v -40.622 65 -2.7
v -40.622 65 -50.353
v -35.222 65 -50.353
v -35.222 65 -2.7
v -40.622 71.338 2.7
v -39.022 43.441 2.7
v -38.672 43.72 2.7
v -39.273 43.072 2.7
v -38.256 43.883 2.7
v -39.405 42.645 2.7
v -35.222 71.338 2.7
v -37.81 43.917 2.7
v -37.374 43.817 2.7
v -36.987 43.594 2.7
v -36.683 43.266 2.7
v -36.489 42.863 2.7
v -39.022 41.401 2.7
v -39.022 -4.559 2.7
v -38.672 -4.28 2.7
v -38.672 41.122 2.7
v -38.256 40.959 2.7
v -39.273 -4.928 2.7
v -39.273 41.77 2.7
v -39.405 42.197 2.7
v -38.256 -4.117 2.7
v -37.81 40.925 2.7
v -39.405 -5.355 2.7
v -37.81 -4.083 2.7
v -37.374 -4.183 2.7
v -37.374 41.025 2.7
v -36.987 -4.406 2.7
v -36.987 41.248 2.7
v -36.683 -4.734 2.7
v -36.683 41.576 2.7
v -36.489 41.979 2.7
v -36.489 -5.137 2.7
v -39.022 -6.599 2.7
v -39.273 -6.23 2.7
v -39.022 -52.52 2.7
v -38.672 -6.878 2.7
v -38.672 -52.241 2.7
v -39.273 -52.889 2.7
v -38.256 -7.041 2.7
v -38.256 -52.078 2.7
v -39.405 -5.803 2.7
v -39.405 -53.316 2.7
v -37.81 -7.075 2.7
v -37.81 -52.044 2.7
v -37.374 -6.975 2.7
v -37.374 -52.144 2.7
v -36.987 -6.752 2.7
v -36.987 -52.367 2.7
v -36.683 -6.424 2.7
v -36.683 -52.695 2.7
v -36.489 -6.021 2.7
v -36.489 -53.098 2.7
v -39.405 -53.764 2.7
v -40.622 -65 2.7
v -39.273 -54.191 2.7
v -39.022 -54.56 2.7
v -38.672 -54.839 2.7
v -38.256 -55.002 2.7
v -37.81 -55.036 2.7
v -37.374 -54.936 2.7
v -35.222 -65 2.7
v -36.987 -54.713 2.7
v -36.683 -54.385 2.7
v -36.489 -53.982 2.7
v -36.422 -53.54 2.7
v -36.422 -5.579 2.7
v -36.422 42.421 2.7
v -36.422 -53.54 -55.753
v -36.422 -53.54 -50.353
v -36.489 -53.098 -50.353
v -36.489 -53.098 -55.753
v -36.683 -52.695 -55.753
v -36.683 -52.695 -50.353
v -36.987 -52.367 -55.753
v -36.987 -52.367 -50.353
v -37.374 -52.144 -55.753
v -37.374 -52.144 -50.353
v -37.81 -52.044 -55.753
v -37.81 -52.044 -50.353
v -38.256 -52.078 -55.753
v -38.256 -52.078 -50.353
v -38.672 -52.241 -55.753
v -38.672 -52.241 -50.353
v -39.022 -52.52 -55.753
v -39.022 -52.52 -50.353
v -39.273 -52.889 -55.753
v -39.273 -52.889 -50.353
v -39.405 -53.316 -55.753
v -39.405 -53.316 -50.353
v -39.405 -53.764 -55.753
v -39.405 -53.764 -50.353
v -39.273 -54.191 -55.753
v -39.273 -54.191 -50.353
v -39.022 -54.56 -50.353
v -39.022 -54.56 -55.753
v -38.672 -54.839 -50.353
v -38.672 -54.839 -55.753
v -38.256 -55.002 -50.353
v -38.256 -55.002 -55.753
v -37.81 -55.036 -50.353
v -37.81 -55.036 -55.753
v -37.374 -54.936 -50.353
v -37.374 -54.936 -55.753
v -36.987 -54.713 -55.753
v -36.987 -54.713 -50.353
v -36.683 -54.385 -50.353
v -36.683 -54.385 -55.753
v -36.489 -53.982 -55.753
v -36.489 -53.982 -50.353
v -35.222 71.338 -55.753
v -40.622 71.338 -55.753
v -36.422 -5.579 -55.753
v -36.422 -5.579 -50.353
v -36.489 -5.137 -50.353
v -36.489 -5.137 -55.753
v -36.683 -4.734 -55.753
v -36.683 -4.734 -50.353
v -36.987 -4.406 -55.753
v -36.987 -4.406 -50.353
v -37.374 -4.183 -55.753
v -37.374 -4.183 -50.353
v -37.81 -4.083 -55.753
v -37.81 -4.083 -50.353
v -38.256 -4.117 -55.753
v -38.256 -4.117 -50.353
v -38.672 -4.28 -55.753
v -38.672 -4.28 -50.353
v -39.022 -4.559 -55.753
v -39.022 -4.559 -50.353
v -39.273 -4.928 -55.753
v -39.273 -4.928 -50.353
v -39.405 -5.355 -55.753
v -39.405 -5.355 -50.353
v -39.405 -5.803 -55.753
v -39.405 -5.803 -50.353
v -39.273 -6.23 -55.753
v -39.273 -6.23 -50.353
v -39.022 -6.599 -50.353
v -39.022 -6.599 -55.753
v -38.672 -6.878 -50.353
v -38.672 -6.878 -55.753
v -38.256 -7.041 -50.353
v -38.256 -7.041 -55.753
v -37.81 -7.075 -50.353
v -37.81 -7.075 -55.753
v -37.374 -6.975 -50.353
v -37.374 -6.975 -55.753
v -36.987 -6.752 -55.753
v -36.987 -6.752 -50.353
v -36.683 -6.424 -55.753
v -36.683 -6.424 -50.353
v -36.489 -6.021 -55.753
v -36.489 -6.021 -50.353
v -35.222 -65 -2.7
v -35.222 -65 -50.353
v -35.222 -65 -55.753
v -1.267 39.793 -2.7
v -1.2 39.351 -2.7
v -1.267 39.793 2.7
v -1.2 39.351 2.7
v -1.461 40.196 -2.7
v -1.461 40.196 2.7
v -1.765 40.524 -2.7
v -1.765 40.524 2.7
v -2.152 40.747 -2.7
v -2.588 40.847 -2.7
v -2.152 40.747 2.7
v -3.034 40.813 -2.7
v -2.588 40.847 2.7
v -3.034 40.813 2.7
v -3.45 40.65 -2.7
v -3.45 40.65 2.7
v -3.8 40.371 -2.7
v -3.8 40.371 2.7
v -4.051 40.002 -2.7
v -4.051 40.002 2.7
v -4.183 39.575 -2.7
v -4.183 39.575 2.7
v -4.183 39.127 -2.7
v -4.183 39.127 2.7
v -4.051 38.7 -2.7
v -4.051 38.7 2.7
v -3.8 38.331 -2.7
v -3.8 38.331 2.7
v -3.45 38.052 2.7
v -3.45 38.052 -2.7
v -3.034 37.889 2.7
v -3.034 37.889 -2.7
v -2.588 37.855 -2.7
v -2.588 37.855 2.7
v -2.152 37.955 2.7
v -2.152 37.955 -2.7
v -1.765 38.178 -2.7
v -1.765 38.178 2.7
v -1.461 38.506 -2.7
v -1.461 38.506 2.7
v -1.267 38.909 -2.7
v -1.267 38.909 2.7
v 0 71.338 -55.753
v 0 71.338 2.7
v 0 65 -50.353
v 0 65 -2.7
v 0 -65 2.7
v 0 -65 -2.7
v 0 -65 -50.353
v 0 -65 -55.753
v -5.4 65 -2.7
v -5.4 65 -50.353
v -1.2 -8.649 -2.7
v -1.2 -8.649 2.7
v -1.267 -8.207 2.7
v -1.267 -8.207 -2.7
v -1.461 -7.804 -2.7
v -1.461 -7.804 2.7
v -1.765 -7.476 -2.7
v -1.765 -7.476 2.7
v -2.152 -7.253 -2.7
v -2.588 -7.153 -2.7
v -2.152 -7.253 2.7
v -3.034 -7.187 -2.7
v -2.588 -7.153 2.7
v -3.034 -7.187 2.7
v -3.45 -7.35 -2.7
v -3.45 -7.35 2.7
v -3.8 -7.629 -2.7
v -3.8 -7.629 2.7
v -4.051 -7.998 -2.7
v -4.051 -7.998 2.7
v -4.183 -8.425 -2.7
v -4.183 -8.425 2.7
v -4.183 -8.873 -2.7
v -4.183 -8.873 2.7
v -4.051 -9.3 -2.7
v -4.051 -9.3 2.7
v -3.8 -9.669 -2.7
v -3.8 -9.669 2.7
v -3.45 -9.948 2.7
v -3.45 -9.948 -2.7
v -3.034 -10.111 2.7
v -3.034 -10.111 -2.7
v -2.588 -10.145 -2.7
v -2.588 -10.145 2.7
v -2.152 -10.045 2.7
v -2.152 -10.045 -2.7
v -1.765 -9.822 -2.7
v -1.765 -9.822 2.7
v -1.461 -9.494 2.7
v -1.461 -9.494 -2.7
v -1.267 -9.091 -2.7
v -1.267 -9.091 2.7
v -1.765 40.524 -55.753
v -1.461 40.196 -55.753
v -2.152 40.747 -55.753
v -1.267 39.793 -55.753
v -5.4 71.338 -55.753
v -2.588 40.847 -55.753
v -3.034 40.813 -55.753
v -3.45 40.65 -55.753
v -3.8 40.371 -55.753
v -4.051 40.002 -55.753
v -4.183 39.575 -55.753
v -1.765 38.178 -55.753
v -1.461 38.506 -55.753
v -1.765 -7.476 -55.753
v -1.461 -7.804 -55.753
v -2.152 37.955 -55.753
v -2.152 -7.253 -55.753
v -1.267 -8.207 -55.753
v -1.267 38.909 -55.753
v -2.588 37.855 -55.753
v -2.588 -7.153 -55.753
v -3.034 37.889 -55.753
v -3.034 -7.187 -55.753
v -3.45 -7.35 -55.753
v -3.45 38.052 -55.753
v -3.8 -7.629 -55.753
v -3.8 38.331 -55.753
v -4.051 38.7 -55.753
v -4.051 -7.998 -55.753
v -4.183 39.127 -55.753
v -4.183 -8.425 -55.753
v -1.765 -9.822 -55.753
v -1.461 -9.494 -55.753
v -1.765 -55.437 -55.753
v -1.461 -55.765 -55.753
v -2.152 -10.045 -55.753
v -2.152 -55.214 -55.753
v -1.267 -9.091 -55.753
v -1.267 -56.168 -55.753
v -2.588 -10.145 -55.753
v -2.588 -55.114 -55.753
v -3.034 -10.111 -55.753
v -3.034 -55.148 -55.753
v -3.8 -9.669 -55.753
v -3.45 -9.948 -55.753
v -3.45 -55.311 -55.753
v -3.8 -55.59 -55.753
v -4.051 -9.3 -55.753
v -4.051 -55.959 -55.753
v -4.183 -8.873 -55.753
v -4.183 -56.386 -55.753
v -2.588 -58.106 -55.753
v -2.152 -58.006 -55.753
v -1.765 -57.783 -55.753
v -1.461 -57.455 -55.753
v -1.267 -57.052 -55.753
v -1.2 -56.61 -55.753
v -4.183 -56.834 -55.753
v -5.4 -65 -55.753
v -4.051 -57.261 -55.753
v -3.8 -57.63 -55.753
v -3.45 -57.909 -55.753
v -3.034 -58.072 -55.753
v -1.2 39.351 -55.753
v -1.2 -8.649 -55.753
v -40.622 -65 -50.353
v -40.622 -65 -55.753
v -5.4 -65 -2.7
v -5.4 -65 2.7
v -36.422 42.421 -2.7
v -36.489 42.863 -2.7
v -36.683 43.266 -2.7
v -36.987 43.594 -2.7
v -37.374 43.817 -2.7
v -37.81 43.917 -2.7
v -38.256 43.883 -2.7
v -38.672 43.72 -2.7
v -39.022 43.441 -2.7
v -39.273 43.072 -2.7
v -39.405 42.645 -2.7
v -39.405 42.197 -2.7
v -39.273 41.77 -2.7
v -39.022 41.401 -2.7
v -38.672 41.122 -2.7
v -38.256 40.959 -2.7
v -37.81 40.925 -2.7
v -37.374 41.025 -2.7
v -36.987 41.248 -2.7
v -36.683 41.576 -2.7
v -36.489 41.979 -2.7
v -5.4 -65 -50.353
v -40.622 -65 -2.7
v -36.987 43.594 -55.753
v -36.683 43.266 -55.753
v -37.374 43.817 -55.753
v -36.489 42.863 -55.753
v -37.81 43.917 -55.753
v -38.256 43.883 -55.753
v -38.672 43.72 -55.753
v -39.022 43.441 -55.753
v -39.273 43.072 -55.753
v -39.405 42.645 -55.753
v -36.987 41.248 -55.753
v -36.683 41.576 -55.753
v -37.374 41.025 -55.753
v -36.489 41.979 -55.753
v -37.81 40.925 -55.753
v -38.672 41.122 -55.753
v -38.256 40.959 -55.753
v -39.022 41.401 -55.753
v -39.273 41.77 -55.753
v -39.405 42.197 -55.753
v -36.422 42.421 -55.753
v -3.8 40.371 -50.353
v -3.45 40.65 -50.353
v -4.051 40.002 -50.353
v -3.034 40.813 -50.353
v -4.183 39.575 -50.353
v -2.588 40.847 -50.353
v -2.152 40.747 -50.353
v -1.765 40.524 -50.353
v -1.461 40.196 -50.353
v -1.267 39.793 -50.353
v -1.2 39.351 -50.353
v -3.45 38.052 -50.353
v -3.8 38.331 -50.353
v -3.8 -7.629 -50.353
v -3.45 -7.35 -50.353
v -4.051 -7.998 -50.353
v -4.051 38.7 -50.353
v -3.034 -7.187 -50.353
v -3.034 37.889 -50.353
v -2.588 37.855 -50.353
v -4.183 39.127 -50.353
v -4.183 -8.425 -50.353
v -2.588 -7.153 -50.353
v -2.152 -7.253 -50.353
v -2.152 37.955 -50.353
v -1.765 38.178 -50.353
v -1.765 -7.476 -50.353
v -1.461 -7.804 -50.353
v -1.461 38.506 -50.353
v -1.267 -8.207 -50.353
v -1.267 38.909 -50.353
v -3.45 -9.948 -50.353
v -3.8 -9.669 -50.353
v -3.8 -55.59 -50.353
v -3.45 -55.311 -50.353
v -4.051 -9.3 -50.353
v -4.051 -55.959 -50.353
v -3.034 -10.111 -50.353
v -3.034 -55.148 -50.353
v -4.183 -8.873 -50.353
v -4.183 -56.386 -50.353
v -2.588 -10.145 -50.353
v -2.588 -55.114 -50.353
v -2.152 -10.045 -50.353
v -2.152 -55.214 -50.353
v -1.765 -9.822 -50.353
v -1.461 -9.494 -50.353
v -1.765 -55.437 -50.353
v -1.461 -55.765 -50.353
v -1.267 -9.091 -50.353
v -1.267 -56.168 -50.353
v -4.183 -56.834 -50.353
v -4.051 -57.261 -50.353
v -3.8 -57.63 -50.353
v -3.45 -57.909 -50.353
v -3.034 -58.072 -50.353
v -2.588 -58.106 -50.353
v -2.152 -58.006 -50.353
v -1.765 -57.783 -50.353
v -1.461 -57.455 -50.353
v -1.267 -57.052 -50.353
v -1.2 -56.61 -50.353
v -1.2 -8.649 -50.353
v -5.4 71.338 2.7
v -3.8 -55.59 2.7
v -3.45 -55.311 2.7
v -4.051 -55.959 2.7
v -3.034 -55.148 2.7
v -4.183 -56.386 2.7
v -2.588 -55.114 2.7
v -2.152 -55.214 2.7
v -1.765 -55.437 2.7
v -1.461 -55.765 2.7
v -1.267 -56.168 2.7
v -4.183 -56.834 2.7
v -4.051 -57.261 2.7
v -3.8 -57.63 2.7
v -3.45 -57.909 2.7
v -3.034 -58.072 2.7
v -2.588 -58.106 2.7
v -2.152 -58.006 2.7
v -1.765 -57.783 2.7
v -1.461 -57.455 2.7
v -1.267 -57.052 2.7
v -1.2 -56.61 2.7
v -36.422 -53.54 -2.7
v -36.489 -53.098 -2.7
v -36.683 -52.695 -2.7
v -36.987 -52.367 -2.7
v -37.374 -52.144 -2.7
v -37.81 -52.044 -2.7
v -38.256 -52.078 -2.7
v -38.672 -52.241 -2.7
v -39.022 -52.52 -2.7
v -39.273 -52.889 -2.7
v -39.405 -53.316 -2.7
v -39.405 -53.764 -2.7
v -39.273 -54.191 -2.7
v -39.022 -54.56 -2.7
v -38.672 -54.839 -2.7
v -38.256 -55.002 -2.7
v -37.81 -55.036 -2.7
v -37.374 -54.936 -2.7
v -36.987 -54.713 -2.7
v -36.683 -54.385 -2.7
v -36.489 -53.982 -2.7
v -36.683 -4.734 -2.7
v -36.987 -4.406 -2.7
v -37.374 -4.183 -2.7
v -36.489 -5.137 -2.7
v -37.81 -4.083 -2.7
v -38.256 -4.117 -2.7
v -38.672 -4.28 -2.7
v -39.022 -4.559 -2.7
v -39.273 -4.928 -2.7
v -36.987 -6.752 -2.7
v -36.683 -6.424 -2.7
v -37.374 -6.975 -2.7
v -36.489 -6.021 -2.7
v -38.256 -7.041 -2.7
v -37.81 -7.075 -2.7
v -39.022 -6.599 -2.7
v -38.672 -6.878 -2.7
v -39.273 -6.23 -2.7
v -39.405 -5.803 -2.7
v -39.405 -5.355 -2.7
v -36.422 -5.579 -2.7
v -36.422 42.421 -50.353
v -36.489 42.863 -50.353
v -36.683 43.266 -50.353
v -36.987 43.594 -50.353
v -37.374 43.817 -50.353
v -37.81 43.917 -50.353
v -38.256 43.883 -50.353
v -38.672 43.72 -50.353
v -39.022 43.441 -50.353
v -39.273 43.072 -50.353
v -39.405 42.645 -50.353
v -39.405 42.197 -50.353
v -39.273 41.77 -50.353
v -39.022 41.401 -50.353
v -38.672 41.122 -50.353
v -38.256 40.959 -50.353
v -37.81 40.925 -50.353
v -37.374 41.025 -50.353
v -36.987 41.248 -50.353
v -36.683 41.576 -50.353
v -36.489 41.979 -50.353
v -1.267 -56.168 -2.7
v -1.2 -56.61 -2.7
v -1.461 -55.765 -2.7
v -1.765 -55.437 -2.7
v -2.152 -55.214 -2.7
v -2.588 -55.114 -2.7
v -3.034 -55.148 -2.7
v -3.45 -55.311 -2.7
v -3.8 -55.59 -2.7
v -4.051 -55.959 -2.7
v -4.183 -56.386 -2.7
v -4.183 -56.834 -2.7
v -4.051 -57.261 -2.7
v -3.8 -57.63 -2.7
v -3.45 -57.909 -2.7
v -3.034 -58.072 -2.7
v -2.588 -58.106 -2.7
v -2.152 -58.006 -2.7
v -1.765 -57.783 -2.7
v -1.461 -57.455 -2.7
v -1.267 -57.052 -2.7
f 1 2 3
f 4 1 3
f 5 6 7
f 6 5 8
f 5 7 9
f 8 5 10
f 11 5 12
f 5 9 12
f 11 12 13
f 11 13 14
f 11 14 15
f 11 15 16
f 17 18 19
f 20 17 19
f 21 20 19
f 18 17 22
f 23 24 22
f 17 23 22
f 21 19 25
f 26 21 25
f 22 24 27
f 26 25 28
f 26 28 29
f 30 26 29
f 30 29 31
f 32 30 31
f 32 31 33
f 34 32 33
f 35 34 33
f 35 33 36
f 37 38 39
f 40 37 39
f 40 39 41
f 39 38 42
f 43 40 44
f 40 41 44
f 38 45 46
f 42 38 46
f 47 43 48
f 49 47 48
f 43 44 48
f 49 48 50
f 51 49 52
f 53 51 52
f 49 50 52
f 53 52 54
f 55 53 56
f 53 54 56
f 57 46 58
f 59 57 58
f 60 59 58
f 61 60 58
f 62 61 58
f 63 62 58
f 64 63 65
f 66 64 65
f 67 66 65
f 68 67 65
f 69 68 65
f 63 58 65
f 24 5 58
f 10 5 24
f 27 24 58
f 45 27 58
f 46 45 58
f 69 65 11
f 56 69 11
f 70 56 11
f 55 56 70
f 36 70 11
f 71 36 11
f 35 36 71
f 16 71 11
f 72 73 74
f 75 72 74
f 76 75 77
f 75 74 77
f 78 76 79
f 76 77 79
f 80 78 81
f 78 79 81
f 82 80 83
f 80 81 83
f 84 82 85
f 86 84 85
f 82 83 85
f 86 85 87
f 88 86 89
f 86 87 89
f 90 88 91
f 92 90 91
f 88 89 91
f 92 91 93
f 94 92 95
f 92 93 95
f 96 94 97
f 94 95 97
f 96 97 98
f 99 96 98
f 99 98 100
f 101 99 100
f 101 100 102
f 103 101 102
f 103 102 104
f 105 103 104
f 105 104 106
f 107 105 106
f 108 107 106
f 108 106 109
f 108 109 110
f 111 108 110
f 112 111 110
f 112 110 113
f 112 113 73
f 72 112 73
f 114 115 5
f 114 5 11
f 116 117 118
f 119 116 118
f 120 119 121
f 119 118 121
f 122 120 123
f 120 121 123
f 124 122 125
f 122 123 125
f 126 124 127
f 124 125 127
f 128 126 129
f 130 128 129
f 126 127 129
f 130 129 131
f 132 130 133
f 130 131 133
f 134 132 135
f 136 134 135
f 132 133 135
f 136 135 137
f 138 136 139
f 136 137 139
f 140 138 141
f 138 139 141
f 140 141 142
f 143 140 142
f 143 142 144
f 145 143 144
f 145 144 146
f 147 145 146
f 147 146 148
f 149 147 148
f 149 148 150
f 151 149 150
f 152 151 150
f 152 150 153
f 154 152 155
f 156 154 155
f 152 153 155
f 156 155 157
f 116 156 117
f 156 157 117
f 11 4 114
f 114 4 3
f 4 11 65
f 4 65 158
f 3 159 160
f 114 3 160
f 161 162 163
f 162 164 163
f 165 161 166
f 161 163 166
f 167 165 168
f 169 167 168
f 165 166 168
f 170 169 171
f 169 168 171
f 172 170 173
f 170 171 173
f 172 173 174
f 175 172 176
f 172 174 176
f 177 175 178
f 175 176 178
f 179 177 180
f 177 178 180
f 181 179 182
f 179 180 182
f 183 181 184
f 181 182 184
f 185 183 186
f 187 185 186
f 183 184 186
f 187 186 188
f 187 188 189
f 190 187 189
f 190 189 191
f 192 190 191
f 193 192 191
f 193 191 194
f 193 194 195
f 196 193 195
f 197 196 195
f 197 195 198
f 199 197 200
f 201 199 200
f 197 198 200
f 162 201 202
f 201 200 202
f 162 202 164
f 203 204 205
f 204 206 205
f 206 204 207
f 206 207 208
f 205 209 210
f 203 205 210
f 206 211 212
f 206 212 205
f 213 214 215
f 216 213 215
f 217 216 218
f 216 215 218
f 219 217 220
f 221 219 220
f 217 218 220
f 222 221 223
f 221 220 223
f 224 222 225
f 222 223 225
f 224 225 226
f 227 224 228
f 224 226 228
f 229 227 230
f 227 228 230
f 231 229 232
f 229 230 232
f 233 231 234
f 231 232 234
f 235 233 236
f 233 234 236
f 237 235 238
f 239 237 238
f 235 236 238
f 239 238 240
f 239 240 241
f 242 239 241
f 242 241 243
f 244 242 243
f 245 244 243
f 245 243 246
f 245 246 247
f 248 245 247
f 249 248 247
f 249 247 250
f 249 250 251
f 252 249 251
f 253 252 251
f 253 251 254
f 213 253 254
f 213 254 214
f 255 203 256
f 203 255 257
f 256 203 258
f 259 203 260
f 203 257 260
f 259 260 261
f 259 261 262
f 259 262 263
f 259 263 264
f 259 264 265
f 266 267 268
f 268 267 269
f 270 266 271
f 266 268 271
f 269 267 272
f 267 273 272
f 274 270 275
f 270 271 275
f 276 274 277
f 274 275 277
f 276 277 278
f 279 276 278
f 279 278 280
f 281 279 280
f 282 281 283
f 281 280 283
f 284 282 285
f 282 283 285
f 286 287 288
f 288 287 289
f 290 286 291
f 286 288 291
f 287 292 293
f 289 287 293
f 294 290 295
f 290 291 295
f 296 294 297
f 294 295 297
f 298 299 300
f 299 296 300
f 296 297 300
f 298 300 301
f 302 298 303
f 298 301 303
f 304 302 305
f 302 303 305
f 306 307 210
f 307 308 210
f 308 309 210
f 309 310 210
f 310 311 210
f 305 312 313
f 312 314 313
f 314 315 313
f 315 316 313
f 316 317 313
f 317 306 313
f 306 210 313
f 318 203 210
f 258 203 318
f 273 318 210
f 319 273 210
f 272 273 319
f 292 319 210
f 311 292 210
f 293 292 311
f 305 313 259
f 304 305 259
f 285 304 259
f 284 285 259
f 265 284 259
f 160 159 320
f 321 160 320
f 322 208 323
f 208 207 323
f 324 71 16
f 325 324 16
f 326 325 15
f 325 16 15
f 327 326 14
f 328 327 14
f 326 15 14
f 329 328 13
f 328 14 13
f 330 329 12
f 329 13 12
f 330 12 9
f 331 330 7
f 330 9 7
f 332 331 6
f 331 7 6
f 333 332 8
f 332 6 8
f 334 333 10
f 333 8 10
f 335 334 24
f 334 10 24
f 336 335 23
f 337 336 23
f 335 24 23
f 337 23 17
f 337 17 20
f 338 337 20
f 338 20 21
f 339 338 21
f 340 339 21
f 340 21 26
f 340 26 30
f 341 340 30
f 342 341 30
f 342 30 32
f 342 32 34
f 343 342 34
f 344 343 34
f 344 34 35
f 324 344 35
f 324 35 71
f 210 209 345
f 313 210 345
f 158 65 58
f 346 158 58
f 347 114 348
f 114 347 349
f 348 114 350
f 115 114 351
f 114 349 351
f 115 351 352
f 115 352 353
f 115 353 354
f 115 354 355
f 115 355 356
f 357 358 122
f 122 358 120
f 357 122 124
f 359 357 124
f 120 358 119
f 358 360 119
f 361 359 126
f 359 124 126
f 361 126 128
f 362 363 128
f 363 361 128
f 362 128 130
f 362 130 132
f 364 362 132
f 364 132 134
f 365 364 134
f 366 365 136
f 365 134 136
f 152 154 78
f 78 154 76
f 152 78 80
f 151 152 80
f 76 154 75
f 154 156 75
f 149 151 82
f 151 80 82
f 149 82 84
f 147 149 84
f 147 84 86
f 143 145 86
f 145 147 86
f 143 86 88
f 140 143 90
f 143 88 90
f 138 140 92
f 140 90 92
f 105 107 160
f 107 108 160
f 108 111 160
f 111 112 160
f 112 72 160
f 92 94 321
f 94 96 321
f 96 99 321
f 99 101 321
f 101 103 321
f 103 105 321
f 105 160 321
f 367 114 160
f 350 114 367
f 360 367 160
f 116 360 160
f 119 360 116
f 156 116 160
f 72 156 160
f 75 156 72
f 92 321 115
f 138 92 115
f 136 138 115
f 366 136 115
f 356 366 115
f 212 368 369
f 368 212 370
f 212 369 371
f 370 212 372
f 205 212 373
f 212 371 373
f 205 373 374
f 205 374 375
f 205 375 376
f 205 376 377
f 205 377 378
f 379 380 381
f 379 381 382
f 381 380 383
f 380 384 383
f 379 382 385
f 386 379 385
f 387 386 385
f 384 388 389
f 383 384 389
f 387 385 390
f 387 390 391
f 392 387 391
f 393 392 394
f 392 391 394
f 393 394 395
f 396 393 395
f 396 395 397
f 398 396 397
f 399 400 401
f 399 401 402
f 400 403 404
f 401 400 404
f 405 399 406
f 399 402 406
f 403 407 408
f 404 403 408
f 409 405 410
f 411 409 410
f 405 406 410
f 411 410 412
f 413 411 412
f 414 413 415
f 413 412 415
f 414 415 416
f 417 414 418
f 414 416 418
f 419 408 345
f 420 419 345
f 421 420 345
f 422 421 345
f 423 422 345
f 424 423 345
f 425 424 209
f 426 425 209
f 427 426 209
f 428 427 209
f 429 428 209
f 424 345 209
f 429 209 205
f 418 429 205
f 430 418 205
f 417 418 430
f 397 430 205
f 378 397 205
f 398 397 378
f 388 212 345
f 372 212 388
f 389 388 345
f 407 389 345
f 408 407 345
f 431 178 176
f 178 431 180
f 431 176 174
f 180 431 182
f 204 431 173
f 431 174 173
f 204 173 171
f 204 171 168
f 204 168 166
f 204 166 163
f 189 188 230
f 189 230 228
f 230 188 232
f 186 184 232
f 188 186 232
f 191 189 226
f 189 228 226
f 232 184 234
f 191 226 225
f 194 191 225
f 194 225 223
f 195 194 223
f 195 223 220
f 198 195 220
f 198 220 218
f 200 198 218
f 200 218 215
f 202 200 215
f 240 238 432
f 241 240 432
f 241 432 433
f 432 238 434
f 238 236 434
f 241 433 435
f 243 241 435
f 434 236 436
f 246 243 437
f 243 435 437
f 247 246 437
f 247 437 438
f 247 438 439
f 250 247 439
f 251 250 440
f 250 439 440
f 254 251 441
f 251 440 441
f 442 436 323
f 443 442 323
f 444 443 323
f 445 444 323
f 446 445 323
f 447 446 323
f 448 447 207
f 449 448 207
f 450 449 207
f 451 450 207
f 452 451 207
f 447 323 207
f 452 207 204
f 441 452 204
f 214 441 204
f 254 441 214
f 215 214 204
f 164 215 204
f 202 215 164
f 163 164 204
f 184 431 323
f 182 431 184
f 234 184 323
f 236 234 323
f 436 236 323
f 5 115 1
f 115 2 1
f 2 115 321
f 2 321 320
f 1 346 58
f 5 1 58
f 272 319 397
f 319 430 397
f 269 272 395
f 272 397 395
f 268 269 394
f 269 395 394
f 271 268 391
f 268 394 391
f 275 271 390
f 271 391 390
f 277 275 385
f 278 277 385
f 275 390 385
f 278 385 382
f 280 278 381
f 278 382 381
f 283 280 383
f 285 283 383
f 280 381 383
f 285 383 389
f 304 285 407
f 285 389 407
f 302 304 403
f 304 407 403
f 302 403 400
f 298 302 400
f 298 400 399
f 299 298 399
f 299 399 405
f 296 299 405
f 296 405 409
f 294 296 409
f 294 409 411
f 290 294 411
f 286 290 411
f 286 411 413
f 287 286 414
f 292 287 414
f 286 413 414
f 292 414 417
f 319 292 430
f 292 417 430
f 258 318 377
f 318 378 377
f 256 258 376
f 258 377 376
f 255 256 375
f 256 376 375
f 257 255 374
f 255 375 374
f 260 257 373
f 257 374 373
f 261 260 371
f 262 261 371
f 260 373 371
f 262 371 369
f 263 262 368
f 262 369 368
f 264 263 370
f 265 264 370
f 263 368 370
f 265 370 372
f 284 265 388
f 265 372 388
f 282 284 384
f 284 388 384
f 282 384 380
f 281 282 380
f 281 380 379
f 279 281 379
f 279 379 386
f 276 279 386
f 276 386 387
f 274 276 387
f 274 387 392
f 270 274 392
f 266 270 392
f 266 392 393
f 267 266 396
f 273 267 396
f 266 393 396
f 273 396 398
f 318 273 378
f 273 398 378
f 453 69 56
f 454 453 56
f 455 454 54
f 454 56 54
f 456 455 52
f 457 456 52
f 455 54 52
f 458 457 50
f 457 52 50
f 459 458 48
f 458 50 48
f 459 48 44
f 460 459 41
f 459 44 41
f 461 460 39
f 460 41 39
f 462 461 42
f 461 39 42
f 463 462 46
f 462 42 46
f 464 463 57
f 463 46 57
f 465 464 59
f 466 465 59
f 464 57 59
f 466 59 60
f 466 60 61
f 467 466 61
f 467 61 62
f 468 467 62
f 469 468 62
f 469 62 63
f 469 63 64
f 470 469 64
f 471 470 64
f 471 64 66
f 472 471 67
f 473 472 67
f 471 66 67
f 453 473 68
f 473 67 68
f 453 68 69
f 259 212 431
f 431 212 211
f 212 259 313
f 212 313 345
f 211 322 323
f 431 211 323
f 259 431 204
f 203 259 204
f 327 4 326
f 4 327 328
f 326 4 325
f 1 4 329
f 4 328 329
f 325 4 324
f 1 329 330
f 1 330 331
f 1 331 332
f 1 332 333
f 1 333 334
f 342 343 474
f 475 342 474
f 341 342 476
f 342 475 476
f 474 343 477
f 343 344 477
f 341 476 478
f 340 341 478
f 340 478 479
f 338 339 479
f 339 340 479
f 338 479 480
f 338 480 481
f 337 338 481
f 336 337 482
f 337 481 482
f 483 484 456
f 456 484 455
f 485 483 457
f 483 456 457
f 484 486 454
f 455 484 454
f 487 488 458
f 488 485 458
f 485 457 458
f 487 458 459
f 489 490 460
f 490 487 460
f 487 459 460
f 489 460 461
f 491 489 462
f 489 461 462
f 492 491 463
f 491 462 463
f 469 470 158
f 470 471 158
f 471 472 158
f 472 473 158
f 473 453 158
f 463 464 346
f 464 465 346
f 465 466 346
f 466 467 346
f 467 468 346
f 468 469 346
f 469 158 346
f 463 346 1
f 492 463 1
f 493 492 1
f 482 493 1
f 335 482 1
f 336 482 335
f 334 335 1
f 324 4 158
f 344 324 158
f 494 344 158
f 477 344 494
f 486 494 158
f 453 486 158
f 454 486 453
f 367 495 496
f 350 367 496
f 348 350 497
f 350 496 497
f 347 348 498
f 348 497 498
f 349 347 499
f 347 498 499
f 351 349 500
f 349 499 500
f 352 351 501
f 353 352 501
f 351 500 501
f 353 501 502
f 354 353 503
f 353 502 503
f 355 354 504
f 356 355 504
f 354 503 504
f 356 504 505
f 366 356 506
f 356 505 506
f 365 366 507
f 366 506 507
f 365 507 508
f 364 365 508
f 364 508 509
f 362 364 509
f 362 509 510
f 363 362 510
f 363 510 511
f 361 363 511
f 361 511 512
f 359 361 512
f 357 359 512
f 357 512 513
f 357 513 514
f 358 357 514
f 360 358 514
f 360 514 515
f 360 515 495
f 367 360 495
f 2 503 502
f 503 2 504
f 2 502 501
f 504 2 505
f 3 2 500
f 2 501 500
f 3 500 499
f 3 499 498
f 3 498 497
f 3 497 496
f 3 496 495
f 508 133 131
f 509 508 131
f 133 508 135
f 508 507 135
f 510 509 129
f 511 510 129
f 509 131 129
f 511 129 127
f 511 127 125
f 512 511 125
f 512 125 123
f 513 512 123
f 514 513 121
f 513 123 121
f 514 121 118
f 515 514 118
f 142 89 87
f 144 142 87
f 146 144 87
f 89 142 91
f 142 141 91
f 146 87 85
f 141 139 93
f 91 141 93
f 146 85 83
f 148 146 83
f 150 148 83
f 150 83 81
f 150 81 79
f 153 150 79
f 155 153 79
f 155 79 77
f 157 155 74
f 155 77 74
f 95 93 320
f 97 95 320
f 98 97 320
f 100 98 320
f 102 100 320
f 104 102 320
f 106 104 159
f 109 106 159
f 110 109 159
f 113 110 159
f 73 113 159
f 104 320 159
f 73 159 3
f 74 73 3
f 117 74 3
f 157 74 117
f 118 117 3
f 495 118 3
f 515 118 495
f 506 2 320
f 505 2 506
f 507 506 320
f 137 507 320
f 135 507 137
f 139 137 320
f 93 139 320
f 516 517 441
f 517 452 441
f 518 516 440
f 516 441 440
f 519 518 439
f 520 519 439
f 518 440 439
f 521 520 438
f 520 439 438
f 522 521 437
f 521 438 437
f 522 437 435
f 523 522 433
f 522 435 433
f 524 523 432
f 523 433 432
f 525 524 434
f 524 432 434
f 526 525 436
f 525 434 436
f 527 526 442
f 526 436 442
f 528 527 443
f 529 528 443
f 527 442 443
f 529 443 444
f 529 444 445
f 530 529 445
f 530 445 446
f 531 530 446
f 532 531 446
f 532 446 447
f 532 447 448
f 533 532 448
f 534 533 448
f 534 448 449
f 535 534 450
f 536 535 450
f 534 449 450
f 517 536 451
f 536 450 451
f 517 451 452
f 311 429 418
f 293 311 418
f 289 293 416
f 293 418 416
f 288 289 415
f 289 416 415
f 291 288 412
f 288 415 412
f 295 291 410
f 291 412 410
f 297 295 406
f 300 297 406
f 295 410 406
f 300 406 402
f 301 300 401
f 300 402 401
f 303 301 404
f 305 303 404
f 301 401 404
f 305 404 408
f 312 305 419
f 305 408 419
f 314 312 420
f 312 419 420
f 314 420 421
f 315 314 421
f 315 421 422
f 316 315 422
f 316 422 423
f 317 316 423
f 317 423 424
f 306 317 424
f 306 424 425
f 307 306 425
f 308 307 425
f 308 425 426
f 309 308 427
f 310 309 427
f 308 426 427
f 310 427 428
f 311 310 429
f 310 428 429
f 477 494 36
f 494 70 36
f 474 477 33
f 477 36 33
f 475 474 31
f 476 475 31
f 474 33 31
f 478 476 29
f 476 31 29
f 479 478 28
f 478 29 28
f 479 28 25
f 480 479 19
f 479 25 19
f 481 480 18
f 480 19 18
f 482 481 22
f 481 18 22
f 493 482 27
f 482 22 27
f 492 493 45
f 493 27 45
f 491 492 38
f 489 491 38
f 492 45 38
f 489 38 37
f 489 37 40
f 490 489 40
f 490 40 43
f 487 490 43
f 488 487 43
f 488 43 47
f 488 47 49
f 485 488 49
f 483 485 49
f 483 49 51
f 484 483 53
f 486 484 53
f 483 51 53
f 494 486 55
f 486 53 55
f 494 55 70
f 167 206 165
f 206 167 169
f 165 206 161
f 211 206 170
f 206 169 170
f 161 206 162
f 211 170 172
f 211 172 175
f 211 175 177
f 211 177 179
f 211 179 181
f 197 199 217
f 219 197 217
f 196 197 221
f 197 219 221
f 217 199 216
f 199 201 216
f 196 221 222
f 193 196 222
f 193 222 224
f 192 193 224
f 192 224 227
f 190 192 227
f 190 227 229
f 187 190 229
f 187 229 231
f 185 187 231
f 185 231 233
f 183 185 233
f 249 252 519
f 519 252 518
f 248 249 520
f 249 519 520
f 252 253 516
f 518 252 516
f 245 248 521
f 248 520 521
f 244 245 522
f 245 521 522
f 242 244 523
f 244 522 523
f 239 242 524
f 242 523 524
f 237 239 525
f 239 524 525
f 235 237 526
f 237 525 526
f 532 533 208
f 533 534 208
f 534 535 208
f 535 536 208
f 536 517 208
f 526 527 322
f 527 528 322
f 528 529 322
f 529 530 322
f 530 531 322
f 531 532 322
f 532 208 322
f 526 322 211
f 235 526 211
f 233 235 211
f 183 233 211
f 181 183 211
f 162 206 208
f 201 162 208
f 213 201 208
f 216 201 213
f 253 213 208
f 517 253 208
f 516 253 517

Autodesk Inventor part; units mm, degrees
ref_plane "YZ Plane" through (0, 0, 0) normal (1, 0, 0) x (0, 1, 0)
ref_plane "XZ Plane" through (0, 0, 0) normal (0, 1, 0) x (-1, 0, 0)
ref_plane "XY Plane" through (0, 0, 0) normal (0, 0, 1) x (1, 0, 0)
sketch "Esboço1" plane through (0, 0, 0) normal (0, 1, 0) x (-1, 0, 0)
  line L0 (0, 2.7) -> (0, -2.7)
  line L1 (0, -2.7) -> (5.4, -2.7)
  line L2 (5.4, -2.7) -> (5.4, 2.7)
  line L3 (5.4, 2.7) -> (0, 2.7)
  line L4 (0, -50.353) -> (0, -55.753)
  line L5 (0, -55.753) -> (5.4, -55.753)
  line L6 (5.4, -55.753) -> (5.4, -50.353)
  line L7 (5.4, -50.353) -> (0, -50.353)
  line L8 (35.222, -50.353) -> (35.222, -55.753)
  line L9 (35.222, -55.753) -> (40.622, -55.753)
  line L10 (40.622, -55.753) -> (40.622, -50.353)
  line L11 (40.622, -50.353) -> (35.222, -50.353)
  line L12 (40.622, -2.7) -> (40.622, 2.7)
  line L13 (40.622, 2.7) -> (35.222, 2.7)
  line L14 (35.222, 2.7) -> (35.222, -2.7)
  line L15 (35.222, -2.7) -> (40.622, -2.7)
  point P0 (0, 0)
  point P1 (0, -53.053)
  point P2 (0, 0)
  point P3 (5.4, 0)
  point P4 (5.4, -53.053)
  point P5 (35.222, -53.053)
  point P6 (35.222, 0)
  point P7 (40.622, 0)
  point P8 (40.622, -53.053)
  point P9 (37.922, -55.753)
  point P10 (2.7, -55.753)
  point P11 (37.922, -2.7)
  point P12 (2.7, -2.7)
  point P13 (37.922, -50.353)
  point P14 (2.7, -50.353)
  point P15 (37.922, 2.7)
  point P16 (2.7, 2.7)
  dimension "d0" = 47.653
  dimension "d7" = 5.4
  dimension "d8" = 35.222
extrude "Extrusão1" add sketch "Esboço1" along normal mid plane 130
sketch "Esboço3" plane through (0, 65, 0) normal (0, 1, 0) x (1, 0, 0)
  line L0 (-40.622, -2.7) -> (-35.222, -2.7) projected
  line L1 (-40.622, 55.753) -> (-35.222, 55.753) projected
  line L2 (-40.622, -2.7) -> (-40.622, 55.753)
  line L3 (-35.222, 55.753) -> (-35.222, 50.353) projected
  line L4 (-40.622, 55.753) -> (-35.222, 55.753)
  line L5 (-35.222, -2.7) -> (-35.222, 2.7) projected
  line L6 (-35.222, 55.753) -> (-35.222, -2.7)
  line L7 (-35.222, -2.7) -> (-40.622, -2.7)
  line L8 (-5.4, 55.753) -> (-5.4, 50.353) projected
  line L9 (-5.4, -2.7) -> (-5.4, 55.753)
  line L10 (0, 55.753) -> (-5.4, 55.753) projected
  line L11 (-5.4, 55.753) -> (0, 55.753)
  line L12 (-5.4, -2.7) -> (0, -2.7) projected
  line L13 (0, 55.753) -> (0, -2.7)
  line L14 (0, -2.7) -> (-5.4, -2.7)
  point P0 (0, 0)
extrude "Extrusão2" add sketch "Esboço3" along normal blind 6.338
sketch "Esboço4" plane through (-5.4, -65, 2.7) normal (0, 0, 1) x (1, 0, 0)
  circle A0 centre (2.7, 8.39) radius 1.5
  circle A1 centre (2.7, 56.351) radius 1.5
  circle A2 centre (2.7, 104.351) radius 1.5
  circle A3 centre (-32.522, 11.46) radius 1.5
  circle A4 centre (-32.522, 59.421) radius 1.5
  circle A5 centre (-32.522, 107.421) radius 1.5
  line L0 (5.4, 0) -> (0, 0) projected
  line L1 (-29.822, 0) -> (-35.222, 0) projected
  point P0 (5.4, 65)
  point P1 (2.7, 0)
  point P2 (-32.522, 0)
  dimension "d9" = 3
  dimension "d20" = 8.39
  dimension "d22" = 47.961
  dimension "d23" = 48
  dimension "d24" = 3.07
  dimension "d25" = 3.07
  dimension "d26" = 3.07
extrude "Extrusão3" cut sketch "Esboço4" against normal up to surface (58.453 mm away)
equation "\"d8\" = Largura_trilhos"
equation "\"d9\" = Parafuso"
equation "\"d24\" = d25"
equation "\"d26\" = d25"
equation "\"Largura_trilhos\" = 35.222"
equation "\"Parafuso\" = 3"
equation "\"d11\" = 3"
equation "\"d13\" = 3"
equation "\"d15\" = 3"
equation "\"d17\" = 3"
equation "\"d19\" = 3"
properties part number "Sustentação Trilhos fixos" material "Plástico PET"
